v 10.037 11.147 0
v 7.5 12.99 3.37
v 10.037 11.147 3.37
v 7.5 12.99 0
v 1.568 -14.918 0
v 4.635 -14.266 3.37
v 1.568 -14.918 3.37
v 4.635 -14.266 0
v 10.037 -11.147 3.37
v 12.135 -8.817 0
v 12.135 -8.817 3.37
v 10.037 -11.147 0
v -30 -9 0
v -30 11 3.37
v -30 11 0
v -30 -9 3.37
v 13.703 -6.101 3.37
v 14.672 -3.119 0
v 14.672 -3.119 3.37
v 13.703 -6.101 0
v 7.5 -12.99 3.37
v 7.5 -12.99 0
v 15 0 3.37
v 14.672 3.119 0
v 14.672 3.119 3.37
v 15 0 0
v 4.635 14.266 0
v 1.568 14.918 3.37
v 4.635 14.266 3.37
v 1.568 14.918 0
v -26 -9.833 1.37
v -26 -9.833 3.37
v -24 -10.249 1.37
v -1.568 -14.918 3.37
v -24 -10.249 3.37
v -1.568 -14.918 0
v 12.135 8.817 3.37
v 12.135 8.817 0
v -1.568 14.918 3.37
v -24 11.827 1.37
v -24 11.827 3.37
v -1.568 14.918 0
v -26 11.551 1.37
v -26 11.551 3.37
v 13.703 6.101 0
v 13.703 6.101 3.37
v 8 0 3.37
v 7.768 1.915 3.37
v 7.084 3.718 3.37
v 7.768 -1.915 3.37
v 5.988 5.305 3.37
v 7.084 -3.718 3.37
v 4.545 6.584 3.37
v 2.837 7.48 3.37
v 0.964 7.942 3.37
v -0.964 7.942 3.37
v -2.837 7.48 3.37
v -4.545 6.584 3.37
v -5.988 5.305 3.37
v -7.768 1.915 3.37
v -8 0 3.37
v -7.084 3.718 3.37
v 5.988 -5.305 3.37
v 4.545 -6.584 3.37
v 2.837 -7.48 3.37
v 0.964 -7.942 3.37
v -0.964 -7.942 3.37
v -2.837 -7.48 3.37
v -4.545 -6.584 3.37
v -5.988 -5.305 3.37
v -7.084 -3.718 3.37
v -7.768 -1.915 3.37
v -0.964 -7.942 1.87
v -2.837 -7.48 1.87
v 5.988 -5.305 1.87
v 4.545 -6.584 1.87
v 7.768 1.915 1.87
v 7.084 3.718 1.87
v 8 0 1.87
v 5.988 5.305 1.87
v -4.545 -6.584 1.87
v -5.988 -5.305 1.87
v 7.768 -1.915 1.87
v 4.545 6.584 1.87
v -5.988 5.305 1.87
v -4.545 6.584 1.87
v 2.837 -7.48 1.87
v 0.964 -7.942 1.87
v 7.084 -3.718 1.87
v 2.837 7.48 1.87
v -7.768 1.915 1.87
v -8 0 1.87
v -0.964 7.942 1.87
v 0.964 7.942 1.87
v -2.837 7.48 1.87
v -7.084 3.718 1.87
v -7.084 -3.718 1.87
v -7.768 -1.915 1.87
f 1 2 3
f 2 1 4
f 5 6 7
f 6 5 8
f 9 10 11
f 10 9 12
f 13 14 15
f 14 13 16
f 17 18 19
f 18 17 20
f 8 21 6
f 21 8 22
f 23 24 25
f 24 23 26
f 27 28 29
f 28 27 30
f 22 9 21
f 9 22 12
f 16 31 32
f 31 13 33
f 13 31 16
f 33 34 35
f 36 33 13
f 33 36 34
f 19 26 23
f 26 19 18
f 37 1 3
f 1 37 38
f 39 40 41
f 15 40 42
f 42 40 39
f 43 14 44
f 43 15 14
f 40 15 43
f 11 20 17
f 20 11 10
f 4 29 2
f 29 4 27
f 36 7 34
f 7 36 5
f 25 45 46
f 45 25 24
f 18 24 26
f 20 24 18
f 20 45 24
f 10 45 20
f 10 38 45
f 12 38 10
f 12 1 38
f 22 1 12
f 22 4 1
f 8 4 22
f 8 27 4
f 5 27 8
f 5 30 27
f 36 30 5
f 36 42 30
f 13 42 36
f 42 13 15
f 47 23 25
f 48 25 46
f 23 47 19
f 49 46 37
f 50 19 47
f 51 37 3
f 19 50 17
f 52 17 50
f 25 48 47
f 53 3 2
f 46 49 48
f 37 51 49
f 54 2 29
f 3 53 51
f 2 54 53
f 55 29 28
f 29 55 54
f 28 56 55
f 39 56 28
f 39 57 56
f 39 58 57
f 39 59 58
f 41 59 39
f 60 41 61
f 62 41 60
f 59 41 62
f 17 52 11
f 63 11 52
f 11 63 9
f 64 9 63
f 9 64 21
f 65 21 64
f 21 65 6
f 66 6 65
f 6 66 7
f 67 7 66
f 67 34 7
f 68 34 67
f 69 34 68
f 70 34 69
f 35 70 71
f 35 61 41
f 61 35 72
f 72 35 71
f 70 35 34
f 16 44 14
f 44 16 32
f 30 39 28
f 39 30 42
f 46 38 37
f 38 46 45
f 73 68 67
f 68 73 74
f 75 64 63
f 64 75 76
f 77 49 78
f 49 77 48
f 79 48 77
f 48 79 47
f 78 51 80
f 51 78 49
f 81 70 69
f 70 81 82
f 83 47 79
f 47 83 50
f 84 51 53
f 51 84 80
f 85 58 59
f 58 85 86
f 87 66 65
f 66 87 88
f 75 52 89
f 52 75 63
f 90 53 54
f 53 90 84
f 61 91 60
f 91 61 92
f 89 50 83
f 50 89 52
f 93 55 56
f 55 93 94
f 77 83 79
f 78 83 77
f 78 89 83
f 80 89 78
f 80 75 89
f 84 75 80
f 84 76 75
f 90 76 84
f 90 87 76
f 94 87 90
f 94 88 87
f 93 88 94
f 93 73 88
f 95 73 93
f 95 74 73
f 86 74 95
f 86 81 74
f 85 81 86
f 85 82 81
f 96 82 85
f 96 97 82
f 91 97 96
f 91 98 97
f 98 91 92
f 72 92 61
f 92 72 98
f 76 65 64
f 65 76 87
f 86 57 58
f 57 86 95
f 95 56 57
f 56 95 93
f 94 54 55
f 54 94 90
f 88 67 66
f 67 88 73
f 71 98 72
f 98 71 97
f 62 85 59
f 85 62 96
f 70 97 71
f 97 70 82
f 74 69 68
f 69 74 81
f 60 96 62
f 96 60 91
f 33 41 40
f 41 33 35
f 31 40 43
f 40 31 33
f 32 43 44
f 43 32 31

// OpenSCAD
//**************************************
// Spares for Torqeedo 1103 outboard motor
// The two key parts are the battery lock pin
// and the deadman key
//
// July 2019
// Dan Freedman dan@done-that.com

// both sets are here in one file 
//********************************************************
// Battery or deadman key for Torqeedo 1103 outboard motor
// select part to make set by setting to 1
    make_key = 1;
    make_pin = 0;
    
    
    // radious of battery pin
    radius  = 4.7;
    //lenght of pin
    lenghtrod = 225;
    //pin  base (head)
    headw   = 11.2;
    headl   = 35.4;
    headd   =   20;
    //lockinh key
    keyw    = 6.8;
    keyl    =   12.8;
    keyd    =   20;
    keyoffset = 9.85;
    // slot at end of pin
    slot_size = [20,3.5,14];
    slot_loc  = [0,4.8,212];
    //pin rope hole location
    hole_loc  = [0,14,6];
    half_key_thick = 3.37;
    //magnet dia
    mag_size   = 8.;
    //magnet thickness
    mag_height = 3.0;
    // deadmankey rope size
    rope_size = 4.0 ; //mm thick
    //magnet center
    mag_hole_depth = half_key_thick-(mag_height/2);
    mag_offset =[0,0,mag_hole_depth];
    
    
//******************************************************
//Battery lock down pin componets
// Basic pin
module key()
    {
        union() {
            cube( [headw,headl,headd],center=false);
            translate([5.5,(headw-radius),0]) cylinder( lenghtrod,radius,radius);
            translate([2.5,19,0]) cube( [keyw,keyl,keyd+headd],center=false);
        }      
 
    }   
// Hole for tie rope
module hole()
    {  
     translate (hole_loc) {
        rotate ([0,90,0])
            cylinder (12,3,3);
     }
 }
 
// Cut slot for end of pin
 module slot()
    {
     translate (slot_loc) {
        cube (slot_size,center=false);
     }
    }
//*****************************************************
// deadman key componets
module deadmankey()
    {
        // frame for deadman key
        hull () {
           cylinder ( half_key_thick,15,15);
           translate( [-30,-9,0]) cube ([24.3,20,half_key_thick]);
        }
                  
    }
    // hole for mag for deadman key
 module mag_hole()
    {
        translate (mag_offset)cylinder ( mag_height/2,mag_size,mag_size);
    }   
    // slot for rope deadman key
module rope_slot() 
        {
           // using 4mm rope  
           slot_depth =  half_key_thick - (rope_size/2);
           translate ( [-26,-11,slot_depth]) cube([rope_size/2,29,3]);
        }


//********************************************************
// Main Execution step        
if (make_key==1) {
    // assemble the deadman key blocks
        difference() { 
            deadmankey();
            mag_hole();
            rope_slot();
        }
    }      
        
 
if (make_pin==1) {
    // assemble the battery lock pin
        difference() { 
            key();
            hole();
            slot();    
        }                    
}           
   
